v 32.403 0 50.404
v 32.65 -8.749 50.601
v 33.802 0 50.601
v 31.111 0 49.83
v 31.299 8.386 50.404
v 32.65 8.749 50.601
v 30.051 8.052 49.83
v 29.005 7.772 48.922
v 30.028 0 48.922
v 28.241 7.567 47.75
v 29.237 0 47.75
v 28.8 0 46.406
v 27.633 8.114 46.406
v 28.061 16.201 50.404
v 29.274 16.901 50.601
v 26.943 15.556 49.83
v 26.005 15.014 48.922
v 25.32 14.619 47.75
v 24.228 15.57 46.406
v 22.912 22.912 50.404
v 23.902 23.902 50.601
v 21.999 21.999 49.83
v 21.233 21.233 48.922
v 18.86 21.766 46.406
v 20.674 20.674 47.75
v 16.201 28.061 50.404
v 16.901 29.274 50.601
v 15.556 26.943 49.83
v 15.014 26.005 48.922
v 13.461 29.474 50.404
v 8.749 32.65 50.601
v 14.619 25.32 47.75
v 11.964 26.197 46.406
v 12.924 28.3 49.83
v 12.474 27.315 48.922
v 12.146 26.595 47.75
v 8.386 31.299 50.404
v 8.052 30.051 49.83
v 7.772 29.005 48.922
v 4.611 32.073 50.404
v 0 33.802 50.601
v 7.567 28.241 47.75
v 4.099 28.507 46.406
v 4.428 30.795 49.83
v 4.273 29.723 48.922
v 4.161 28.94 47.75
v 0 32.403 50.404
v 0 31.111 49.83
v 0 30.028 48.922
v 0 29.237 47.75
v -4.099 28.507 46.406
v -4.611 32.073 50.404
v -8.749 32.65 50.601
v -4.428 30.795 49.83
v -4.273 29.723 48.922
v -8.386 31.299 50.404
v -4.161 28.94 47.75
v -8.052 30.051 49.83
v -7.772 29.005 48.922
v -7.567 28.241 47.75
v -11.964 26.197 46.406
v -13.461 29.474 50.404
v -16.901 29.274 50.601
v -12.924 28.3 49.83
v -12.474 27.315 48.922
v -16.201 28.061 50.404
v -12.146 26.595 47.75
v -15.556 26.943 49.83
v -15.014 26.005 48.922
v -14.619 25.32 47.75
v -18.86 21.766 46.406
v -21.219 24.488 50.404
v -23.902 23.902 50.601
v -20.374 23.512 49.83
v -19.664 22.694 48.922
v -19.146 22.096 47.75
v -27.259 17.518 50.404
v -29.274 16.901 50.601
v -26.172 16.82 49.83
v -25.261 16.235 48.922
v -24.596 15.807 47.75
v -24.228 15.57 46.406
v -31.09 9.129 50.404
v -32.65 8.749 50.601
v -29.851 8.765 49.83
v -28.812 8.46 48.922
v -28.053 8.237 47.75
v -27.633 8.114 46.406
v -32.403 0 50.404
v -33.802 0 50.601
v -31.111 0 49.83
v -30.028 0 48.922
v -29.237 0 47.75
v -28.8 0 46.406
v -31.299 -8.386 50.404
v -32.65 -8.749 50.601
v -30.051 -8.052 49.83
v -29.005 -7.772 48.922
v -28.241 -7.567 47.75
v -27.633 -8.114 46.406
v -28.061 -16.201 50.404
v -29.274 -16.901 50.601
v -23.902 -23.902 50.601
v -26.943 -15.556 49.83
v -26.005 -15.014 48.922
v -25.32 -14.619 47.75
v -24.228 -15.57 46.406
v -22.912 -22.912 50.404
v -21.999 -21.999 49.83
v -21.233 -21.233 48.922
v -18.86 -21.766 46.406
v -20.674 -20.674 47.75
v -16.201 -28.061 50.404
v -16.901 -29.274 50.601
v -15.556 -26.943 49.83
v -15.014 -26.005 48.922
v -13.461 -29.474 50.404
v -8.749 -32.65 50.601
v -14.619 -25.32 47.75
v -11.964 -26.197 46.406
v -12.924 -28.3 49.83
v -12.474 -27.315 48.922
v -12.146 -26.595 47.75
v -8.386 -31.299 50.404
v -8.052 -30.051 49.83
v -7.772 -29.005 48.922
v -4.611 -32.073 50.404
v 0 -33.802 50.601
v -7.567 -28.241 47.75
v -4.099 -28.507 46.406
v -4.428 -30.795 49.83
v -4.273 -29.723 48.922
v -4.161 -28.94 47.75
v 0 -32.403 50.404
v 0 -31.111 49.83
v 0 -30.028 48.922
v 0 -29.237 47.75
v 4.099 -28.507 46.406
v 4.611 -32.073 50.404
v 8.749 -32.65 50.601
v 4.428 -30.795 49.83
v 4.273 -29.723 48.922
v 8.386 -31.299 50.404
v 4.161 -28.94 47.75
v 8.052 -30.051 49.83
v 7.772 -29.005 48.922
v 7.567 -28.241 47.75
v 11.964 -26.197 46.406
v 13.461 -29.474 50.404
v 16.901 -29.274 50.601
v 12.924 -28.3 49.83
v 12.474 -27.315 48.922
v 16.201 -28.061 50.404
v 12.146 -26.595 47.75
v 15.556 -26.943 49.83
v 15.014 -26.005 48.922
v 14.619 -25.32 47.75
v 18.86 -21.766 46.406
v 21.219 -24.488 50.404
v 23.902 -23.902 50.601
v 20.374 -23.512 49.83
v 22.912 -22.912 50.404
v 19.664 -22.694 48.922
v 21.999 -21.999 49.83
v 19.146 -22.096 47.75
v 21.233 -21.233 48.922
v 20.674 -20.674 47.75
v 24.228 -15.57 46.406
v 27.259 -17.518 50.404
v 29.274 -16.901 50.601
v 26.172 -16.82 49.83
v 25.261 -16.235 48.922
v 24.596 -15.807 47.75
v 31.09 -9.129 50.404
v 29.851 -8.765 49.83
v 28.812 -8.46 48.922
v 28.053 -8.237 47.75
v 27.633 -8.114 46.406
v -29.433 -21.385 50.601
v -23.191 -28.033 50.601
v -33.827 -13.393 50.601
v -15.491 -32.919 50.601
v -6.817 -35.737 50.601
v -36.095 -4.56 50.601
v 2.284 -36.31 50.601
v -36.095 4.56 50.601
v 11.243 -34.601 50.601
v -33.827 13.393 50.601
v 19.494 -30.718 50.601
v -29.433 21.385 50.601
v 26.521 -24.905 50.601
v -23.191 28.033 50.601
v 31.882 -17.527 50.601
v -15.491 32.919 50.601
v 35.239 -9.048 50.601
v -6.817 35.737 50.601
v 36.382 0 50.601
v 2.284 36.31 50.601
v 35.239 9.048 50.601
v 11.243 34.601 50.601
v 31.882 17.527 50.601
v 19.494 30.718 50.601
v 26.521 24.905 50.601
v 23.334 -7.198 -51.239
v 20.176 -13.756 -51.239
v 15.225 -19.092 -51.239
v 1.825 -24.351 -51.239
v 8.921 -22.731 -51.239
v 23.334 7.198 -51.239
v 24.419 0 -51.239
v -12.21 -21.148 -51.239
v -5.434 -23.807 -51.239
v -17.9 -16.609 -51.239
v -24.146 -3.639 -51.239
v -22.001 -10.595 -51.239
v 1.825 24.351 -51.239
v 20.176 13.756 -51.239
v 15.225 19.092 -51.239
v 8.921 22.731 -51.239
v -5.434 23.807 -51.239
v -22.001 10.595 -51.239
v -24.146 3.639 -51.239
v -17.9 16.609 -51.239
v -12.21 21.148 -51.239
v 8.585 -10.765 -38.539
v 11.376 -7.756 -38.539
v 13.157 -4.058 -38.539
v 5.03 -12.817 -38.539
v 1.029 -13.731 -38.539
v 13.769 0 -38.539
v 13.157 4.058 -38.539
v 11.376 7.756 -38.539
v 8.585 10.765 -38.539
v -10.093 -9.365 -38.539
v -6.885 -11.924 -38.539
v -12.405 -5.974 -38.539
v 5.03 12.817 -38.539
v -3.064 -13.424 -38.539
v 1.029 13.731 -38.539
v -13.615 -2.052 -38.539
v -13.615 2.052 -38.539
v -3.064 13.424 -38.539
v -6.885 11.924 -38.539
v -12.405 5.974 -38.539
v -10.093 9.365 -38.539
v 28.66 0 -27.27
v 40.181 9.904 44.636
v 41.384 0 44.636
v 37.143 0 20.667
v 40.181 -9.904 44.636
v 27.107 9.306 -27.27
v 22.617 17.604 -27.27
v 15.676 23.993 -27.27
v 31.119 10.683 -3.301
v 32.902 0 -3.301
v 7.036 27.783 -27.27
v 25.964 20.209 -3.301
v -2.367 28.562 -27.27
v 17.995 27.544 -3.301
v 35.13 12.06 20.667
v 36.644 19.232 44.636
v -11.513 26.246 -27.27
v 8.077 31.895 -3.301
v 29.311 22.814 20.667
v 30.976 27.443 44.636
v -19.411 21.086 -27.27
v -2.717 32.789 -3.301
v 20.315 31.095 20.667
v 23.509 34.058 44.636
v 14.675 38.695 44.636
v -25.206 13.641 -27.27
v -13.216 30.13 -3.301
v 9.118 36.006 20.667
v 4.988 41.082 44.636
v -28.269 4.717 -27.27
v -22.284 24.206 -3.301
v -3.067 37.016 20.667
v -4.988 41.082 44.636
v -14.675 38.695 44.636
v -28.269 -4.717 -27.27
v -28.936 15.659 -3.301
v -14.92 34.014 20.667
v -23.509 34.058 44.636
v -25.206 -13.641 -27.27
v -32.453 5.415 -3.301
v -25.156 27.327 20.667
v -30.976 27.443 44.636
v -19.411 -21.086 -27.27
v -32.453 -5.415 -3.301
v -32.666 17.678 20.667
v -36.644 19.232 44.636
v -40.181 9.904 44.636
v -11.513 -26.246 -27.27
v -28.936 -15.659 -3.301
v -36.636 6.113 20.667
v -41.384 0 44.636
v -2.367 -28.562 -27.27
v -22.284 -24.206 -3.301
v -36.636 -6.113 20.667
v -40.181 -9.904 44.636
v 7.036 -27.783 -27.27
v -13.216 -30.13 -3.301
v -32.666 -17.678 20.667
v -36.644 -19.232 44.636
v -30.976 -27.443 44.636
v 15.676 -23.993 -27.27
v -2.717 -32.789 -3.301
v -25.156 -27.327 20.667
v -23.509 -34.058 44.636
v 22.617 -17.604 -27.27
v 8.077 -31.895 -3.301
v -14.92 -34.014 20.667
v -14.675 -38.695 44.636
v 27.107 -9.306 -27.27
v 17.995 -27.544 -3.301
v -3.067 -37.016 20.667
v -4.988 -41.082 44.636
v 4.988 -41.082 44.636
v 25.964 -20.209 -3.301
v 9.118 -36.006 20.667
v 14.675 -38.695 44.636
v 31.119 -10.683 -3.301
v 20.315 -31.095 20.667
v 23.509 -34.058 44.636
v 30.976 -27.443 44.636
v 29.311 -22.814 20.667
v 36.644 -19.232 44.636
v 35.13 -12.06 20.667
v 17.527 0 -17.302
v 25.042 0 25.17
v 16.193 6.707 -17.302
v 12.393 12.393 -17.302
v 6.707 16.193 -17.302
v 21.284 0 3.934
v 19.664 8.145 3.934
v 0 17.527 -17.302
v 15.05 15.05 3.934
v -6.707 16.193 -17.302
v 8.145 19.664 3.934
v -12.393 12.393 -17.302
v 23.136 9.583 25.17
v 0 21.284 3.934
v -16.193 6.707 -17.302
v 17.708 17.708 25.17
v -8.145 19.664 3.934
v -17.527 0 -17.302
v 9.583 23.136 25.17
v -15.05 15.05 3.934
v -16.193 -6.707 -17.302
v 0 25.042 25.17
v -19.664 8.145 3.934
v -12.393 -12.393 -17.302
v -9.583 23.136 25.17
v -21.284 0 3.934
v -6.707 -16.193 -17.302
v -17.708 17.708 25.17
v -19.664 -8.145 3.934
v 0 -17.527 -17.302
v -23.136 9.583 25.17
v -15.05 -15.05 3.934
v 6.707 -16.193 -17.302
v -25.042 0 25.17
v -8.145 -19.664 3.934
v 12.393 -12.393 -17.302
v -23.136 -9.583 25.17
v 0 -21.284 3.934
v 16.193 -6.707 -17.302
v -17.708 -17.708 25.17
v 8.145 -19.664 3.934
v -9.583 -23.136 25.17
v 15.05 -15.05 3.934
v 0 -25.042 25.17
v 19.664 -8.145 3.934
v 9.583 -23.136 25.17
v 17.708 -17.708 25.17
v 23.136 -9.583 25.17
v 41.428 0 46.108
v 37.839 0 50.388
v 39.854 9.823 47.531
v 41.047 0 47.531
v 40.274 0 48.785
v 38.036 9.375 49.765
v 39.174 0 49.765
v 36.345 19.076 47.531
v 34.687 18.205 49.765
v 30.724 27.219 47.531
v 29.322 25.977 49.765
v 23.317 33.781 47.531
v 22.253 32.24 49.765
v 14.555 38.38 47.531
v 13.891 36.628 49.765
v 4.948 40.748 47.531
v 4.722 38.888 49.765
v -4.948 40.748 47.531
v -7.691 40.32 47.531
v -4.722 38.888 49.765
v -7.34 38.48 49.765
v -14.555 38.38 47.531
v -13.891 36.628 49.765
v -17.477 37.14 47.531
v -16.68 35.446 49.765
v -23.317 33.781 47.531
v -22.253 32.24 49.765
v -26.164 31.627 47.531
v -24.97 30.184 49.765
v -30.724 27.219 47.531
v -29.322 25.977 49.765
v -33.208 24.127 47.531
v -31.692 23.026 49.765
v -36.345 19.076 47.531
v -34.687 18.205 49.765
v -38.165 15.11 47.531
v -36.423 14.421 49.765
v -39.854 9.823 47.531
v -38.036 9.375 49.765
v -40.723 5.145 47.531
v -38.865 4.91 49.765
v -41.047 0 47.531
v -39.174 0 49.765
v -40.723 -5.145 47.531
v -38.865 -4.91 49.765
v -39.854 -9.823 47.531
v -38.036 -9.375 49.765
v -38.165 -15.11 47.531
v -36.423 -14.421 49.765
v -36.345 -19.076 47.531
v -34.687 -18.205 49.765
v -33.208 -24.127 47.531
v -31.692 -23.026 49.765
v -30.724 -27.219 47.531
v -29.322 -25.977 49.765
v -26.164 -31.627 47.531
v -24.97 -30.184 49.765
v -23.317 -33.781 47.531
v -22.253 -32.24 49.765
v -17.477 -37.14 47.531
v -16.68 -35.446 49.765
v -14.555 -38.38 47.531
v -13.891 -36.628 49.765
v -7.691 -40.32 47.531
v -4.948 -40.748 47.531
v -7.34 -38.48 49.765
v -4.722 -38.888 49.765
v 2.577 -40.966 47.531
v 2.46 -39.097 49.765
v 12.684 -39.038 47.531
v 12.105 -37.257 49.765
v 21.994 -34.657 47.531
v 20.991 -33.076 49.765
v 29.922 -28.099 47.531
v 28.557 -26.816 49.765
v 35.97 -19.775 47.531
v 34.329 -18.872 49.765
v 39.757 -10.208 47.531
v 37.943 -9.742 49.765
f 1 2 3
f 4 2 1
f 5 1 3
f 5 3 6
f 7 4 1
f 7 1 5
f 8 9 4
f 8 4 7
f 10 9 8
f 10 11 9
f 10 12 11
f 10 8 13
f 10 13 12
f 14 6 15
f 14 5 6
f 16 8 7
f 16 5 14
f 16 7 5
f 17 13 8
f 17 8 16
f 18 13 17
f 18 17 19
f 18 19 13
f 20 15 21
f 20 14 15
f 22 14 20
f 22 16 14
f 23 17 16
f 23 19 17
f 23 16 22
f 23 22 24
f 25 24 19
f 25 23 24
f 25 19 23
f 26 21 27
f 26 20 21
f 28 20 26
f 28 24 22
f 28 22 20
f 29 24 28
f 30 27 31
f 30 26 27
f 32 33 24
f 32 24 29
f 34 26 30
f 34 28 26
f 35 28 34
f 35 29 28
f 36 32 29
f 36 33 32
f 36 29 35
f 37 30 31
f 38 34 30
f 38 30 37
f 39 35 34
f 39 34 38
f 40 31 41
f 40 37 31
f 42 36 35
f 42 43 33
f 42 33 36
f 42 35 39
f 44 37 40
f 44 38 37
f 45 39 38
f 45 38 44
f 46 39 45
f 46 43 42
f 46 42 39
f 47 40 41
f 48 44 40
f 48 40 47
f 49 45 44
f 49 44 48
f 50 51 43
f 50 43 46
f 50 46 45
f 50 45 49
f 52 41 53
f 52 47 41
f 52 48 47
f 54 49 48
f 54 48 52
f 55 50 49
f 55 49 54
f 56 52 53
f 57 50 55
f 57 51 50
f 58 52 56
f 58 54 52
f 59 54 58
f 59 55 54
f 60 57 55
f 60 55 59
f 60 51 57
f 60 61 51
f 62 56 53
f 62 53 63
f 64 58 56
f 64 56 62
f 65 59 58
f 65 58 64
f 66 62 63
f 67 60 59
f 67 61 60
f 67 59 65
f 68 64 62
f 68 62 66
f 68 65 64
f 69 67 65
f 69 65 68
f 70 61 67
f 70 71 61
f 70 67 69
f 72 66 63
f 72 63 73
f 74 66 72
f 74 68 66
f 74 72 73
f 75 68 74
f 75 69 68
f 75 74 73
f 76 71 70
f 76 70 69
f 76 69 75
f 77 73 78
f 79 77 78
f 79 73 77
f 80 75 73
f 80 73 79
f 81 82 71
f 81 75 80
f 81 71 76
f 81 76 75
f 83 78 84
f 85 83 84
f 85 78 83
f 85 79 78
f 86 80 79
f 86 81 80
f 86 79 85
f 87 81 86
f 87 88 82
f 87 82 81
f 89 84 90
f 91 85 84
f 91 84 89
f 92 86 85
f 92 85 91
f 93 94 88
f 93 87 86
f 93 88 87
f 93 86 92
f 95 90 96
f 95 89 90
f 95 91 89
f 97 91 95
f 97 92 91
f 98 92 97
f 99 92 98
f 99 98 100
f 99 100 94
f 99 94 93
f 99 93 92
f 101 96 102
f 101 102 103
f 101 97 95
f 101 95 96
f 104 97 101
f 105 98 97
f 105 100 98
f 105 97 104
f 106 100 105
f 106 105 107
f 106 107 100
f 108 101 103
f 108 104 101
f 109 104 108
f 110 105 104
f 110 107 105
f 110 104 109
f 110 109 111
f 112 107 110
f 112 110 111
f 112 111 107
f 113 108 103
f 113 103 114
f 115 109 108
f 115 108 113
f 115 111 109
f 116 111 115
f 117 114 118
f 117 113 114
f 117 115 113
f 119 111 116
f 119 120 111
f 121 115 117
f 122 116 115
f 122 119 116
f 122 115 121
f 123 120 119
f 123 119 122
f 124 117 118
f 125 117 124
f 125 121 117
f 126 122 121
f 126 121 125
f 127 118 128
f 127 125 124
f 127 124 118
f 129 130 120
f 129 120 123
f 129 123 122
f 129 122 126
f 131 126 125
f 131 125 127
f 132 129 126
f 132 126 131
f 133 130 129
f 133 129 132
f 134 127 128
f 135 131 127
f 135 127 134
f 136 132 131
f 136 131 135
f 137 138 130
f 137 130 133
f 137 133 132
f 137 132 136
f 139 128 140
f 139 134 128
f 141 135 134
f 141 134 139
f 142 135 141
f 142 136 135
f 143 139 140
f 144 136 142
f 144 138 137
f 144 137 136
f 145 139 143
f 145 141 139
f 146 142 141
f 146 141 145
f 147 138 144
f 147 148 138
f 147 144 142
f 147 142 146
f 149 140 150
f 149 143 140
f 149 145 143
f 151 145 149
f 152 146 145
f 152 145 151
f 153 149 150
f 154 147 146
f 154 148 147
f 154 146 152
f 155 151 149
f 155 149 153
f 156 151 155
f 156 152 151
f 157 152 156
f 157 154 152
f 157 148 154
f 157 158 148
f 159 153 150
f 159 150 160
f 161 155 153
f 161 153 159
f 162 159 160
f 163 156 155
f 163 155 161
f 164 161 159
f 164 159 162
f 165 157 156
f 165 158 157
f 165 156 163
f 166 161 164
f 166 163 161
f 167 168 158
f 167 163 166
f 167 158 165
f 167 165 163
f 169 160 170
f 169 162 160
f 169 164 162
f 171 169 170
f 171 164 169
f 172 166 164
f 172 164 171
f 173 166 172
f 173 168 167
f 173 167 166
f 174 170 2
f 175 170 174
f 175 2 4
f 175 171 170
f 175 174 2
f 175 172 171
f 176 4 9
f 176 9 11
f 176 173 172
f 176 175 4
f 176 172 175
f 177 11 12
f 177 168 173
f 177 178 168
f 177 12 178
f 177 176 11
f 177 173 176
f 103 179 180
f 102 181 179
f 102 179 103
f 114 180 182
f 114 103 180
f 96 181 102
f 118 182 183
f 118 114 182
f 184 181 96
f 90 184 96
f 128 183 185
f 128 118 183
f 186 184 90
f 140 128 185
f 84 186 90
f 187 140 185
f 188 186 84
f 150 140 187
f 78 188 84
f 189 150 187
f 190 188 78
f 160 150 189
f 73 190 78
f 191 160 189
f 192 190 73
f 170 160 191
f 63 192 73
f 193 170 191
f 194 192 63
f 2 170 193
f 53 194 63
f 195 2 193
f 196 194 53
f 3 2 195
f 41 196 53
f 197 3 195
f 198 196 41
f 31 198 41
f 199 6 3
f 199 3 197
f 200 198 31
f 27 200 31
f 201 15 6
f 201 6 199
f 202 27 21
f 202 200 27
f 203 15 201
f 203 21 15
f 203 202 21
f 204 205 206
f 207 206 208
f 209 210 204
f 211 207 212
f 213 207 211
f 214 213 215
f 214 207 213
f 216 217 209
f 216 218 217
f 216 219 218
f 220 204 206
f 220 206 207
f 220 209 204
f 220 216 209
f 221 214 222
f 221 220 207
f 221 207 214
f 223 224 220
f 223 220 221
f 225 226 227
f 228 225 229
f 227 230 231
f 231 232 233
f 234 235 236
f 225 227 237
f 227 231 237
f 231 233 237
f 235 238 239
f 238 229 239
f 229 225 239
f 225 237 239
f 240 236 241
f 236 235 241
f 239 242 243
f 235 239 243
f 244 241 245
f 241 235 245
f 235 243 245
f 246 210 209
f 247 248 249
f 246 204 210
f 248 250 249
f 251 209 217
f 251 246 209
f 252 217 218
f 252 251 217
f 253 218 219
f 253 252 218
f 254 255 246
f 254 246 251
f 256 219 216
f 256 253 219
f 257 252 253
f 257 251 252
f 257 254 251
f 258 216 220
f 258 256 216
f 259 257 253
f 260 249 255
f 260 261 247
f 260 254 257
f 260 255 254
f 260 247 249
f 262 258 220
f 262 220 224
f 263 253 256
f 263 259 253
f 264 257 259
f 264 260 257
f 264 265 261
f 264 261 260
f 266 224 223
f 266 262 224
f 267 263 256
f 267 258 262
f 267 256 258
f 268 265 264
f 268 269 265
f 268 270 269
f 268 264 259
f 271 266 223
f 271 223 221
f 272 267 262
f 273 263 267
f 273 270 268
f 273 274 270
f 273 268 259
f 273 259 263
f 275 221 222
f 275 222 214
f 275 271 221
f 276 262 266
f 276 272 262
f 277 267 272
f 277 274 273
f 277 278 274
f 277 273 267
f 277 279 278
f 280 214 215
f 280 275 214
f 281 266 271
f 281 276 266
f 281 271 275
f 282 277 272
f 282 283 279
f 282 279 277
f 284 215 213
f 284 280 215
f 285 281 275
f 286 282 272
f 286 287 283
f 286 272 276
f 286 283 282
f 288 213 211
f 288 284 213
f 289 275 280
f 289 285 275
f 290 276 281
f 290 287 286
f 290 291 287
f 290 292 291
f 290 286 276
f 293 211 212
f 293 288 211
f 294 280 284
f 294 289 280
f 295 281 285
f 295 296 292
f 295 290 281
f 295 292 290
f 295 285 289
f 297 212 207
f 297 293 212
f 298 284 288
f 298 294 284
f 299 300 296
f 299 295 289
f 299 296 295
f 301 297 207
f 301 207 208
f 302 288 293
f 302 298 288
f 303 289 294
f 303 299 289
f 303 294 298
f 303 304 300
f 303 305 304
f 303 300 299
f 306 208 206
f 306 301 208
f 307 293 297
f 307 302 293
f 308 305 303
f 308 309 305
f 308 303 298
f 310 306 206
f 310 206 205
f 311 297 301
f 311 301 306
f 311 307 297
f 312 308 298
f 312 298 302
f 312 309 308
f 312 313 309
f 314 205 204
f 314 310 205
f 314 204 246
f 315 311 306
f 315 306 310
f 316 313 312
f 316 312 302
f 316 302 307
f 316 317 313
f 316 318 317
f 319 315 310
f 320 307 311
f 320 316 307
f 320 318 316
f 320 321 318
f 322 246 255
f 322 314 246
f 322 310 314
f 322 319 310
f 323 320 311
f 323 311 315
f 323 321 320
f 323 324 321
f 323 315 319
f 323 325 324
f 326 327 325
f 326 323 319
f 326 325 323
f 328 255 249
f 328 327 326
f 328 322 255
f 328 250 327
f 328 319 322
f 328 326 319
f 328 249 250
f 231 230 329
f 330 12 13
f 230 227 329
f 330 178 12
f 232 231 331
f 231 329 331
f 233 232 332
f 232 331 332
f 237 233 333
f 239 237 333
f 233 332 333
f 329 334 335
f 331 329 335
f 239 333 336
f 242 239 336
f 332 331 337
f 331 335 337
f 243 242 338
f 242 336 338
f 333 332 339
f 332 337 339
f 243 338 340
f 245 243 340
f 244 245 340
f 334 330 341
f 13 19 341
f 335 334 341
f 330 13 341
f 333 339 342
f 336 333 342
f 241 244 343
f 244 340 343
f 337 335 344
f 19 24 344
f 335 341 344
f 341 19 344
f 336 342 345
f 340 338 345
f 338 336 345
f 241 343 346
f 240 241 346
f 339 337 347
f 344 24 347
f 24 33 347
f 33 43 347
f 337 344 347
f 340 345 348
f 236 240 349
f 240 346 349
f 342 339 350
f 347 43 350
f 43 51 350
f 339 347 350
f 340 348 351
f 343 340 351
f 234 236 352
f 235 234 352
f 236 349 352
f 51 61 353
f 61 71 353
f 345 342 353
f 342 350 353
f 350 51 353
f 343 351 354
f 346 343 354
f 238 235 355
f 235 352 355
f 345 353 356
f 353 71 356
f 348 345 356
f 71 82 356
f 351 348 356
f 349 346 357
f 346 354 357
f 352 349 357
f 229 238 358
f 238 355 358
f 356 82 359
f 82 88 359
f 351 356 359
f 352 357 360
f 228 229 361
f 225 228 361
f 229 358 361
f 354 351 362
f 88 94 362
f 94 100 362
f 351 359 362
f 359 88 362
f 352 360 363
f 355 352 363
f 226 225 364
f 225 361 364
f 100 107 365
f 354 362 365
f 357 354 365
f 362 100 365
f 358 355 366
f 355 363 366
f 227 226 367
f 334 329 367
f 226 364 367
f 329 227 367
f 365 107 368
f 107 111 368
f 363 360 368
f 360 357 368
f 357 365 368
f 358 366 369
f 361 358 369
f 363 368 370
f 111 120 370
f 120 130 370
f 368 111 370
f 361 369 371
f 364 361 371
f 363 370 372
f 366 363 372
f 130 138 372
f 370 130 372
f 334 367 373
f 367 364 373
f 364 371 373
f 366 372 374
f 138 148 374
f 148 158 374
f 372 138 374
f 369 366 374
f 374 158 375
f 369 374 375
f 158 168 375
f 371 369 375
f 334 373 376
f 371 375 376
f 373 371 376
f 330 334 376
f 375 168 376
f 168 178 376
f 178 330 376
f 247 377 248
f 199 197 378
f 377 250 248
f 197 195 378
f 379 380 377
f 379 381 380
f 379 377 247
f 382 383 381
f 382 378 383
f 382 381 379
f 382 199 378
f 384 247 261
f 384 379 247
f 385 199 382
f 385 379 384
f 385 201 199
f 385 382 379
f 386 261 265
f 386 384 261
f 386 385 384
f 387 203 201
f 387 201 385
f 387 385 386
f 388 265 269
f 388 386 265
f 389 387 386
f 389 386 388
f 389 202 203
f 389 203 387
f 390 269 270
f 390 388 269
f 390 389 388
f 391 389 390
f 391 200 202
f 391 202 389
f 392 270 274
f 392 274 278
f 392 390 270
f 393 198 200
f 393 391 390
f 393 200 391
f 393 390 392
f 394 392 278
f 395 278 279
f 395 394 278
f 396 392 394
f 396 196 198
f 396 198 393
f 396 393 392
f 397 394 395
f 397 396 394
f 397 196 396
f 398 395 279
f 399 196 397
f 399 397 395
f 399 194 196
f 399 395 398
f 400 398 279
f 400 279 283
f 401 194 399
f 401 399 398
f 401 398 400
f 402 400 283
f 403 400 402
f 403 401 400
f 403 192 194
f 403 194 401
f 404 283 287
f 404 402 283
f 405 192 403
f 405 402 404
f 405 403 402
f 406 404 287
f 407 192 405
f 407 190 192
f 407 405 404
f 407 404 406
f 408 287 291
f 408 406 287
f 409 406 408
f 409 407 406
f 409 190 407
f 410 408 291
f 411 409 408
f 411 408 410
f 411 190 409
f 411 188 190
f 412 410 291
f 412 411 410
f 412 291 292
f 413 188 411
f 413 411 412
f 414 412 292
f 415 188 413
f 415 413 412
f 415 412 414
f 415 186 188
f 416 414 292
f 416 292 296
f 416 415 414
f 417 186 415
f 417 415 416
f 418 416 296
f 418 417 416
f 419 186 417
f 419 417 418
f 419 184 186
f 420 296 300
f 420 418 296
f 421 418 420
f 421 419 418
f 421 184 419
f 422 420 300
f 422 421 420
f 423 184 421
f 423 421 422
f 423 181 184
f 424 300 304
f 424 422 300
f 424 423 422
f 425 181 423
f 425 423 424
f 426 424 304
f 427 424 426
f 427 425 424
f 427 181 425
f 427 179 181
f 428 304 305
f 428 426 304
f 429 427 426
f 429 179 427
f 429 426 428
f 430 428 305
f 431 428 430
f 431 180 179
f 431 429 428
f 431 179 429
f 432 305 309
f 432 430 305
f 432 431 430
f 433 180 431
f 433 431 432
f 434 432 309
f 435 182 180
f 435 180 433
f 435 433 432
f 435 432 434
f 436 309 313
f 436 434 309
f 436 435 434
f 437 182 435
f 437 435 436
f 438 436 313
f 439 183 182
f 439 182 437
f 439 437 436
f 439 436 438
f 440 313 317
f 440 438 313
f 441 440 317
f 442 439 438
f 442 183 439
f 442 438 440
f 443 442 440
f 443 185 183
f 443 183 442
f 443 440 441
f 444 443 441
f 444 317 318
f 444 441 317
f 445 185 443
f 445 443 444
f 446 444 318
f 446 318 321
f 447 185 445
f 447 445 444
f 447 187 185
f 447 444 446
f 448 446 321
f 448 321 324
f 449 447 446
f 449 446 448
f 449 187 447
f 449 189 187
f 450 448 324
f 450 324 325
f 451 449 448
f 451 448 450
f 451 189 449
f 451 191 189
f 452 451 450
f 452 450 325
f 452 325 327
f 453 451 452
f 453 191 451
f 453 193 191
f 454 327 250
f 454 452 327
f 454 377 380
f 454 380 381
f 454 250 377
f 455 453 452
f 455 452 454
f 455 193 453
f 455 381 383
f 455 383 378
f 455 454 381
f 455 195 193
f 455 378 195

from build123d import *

# Parameters (mm, degrees)
F0_T = -12.7
F1_R = 5.08


with BuildPart() as f3:
    # F2 (on Front) → F3 (revolve)
    with BuildSketch(Plane.XZ):
        Polygon((42.4395352602, 50.6010726094), (0, 50.6010726094), (0, -51.2385219336), (24.419054389, -51.2385219336), align=None)
    revolve(axis=Axis((0, 0, -0.3187246621), (0, 0, 1)))

    # F0
    f0_openings = [f3.faces().sort_by_distance(p)[0] for p in [
        (0, 0, 50.601073),
    ]]
    offset(amount=F0_T, openings=f0_openings)

    # F1
    f1_edges = [f3.edges().sort_by_distance(p)[0] for p in [
        (-42.439535, 0, 50.601073),
        (-29.542242, 0, 50.601073),
    ]]
    fillet(f1_edges, radius=F1_R)


solid = f3.part
